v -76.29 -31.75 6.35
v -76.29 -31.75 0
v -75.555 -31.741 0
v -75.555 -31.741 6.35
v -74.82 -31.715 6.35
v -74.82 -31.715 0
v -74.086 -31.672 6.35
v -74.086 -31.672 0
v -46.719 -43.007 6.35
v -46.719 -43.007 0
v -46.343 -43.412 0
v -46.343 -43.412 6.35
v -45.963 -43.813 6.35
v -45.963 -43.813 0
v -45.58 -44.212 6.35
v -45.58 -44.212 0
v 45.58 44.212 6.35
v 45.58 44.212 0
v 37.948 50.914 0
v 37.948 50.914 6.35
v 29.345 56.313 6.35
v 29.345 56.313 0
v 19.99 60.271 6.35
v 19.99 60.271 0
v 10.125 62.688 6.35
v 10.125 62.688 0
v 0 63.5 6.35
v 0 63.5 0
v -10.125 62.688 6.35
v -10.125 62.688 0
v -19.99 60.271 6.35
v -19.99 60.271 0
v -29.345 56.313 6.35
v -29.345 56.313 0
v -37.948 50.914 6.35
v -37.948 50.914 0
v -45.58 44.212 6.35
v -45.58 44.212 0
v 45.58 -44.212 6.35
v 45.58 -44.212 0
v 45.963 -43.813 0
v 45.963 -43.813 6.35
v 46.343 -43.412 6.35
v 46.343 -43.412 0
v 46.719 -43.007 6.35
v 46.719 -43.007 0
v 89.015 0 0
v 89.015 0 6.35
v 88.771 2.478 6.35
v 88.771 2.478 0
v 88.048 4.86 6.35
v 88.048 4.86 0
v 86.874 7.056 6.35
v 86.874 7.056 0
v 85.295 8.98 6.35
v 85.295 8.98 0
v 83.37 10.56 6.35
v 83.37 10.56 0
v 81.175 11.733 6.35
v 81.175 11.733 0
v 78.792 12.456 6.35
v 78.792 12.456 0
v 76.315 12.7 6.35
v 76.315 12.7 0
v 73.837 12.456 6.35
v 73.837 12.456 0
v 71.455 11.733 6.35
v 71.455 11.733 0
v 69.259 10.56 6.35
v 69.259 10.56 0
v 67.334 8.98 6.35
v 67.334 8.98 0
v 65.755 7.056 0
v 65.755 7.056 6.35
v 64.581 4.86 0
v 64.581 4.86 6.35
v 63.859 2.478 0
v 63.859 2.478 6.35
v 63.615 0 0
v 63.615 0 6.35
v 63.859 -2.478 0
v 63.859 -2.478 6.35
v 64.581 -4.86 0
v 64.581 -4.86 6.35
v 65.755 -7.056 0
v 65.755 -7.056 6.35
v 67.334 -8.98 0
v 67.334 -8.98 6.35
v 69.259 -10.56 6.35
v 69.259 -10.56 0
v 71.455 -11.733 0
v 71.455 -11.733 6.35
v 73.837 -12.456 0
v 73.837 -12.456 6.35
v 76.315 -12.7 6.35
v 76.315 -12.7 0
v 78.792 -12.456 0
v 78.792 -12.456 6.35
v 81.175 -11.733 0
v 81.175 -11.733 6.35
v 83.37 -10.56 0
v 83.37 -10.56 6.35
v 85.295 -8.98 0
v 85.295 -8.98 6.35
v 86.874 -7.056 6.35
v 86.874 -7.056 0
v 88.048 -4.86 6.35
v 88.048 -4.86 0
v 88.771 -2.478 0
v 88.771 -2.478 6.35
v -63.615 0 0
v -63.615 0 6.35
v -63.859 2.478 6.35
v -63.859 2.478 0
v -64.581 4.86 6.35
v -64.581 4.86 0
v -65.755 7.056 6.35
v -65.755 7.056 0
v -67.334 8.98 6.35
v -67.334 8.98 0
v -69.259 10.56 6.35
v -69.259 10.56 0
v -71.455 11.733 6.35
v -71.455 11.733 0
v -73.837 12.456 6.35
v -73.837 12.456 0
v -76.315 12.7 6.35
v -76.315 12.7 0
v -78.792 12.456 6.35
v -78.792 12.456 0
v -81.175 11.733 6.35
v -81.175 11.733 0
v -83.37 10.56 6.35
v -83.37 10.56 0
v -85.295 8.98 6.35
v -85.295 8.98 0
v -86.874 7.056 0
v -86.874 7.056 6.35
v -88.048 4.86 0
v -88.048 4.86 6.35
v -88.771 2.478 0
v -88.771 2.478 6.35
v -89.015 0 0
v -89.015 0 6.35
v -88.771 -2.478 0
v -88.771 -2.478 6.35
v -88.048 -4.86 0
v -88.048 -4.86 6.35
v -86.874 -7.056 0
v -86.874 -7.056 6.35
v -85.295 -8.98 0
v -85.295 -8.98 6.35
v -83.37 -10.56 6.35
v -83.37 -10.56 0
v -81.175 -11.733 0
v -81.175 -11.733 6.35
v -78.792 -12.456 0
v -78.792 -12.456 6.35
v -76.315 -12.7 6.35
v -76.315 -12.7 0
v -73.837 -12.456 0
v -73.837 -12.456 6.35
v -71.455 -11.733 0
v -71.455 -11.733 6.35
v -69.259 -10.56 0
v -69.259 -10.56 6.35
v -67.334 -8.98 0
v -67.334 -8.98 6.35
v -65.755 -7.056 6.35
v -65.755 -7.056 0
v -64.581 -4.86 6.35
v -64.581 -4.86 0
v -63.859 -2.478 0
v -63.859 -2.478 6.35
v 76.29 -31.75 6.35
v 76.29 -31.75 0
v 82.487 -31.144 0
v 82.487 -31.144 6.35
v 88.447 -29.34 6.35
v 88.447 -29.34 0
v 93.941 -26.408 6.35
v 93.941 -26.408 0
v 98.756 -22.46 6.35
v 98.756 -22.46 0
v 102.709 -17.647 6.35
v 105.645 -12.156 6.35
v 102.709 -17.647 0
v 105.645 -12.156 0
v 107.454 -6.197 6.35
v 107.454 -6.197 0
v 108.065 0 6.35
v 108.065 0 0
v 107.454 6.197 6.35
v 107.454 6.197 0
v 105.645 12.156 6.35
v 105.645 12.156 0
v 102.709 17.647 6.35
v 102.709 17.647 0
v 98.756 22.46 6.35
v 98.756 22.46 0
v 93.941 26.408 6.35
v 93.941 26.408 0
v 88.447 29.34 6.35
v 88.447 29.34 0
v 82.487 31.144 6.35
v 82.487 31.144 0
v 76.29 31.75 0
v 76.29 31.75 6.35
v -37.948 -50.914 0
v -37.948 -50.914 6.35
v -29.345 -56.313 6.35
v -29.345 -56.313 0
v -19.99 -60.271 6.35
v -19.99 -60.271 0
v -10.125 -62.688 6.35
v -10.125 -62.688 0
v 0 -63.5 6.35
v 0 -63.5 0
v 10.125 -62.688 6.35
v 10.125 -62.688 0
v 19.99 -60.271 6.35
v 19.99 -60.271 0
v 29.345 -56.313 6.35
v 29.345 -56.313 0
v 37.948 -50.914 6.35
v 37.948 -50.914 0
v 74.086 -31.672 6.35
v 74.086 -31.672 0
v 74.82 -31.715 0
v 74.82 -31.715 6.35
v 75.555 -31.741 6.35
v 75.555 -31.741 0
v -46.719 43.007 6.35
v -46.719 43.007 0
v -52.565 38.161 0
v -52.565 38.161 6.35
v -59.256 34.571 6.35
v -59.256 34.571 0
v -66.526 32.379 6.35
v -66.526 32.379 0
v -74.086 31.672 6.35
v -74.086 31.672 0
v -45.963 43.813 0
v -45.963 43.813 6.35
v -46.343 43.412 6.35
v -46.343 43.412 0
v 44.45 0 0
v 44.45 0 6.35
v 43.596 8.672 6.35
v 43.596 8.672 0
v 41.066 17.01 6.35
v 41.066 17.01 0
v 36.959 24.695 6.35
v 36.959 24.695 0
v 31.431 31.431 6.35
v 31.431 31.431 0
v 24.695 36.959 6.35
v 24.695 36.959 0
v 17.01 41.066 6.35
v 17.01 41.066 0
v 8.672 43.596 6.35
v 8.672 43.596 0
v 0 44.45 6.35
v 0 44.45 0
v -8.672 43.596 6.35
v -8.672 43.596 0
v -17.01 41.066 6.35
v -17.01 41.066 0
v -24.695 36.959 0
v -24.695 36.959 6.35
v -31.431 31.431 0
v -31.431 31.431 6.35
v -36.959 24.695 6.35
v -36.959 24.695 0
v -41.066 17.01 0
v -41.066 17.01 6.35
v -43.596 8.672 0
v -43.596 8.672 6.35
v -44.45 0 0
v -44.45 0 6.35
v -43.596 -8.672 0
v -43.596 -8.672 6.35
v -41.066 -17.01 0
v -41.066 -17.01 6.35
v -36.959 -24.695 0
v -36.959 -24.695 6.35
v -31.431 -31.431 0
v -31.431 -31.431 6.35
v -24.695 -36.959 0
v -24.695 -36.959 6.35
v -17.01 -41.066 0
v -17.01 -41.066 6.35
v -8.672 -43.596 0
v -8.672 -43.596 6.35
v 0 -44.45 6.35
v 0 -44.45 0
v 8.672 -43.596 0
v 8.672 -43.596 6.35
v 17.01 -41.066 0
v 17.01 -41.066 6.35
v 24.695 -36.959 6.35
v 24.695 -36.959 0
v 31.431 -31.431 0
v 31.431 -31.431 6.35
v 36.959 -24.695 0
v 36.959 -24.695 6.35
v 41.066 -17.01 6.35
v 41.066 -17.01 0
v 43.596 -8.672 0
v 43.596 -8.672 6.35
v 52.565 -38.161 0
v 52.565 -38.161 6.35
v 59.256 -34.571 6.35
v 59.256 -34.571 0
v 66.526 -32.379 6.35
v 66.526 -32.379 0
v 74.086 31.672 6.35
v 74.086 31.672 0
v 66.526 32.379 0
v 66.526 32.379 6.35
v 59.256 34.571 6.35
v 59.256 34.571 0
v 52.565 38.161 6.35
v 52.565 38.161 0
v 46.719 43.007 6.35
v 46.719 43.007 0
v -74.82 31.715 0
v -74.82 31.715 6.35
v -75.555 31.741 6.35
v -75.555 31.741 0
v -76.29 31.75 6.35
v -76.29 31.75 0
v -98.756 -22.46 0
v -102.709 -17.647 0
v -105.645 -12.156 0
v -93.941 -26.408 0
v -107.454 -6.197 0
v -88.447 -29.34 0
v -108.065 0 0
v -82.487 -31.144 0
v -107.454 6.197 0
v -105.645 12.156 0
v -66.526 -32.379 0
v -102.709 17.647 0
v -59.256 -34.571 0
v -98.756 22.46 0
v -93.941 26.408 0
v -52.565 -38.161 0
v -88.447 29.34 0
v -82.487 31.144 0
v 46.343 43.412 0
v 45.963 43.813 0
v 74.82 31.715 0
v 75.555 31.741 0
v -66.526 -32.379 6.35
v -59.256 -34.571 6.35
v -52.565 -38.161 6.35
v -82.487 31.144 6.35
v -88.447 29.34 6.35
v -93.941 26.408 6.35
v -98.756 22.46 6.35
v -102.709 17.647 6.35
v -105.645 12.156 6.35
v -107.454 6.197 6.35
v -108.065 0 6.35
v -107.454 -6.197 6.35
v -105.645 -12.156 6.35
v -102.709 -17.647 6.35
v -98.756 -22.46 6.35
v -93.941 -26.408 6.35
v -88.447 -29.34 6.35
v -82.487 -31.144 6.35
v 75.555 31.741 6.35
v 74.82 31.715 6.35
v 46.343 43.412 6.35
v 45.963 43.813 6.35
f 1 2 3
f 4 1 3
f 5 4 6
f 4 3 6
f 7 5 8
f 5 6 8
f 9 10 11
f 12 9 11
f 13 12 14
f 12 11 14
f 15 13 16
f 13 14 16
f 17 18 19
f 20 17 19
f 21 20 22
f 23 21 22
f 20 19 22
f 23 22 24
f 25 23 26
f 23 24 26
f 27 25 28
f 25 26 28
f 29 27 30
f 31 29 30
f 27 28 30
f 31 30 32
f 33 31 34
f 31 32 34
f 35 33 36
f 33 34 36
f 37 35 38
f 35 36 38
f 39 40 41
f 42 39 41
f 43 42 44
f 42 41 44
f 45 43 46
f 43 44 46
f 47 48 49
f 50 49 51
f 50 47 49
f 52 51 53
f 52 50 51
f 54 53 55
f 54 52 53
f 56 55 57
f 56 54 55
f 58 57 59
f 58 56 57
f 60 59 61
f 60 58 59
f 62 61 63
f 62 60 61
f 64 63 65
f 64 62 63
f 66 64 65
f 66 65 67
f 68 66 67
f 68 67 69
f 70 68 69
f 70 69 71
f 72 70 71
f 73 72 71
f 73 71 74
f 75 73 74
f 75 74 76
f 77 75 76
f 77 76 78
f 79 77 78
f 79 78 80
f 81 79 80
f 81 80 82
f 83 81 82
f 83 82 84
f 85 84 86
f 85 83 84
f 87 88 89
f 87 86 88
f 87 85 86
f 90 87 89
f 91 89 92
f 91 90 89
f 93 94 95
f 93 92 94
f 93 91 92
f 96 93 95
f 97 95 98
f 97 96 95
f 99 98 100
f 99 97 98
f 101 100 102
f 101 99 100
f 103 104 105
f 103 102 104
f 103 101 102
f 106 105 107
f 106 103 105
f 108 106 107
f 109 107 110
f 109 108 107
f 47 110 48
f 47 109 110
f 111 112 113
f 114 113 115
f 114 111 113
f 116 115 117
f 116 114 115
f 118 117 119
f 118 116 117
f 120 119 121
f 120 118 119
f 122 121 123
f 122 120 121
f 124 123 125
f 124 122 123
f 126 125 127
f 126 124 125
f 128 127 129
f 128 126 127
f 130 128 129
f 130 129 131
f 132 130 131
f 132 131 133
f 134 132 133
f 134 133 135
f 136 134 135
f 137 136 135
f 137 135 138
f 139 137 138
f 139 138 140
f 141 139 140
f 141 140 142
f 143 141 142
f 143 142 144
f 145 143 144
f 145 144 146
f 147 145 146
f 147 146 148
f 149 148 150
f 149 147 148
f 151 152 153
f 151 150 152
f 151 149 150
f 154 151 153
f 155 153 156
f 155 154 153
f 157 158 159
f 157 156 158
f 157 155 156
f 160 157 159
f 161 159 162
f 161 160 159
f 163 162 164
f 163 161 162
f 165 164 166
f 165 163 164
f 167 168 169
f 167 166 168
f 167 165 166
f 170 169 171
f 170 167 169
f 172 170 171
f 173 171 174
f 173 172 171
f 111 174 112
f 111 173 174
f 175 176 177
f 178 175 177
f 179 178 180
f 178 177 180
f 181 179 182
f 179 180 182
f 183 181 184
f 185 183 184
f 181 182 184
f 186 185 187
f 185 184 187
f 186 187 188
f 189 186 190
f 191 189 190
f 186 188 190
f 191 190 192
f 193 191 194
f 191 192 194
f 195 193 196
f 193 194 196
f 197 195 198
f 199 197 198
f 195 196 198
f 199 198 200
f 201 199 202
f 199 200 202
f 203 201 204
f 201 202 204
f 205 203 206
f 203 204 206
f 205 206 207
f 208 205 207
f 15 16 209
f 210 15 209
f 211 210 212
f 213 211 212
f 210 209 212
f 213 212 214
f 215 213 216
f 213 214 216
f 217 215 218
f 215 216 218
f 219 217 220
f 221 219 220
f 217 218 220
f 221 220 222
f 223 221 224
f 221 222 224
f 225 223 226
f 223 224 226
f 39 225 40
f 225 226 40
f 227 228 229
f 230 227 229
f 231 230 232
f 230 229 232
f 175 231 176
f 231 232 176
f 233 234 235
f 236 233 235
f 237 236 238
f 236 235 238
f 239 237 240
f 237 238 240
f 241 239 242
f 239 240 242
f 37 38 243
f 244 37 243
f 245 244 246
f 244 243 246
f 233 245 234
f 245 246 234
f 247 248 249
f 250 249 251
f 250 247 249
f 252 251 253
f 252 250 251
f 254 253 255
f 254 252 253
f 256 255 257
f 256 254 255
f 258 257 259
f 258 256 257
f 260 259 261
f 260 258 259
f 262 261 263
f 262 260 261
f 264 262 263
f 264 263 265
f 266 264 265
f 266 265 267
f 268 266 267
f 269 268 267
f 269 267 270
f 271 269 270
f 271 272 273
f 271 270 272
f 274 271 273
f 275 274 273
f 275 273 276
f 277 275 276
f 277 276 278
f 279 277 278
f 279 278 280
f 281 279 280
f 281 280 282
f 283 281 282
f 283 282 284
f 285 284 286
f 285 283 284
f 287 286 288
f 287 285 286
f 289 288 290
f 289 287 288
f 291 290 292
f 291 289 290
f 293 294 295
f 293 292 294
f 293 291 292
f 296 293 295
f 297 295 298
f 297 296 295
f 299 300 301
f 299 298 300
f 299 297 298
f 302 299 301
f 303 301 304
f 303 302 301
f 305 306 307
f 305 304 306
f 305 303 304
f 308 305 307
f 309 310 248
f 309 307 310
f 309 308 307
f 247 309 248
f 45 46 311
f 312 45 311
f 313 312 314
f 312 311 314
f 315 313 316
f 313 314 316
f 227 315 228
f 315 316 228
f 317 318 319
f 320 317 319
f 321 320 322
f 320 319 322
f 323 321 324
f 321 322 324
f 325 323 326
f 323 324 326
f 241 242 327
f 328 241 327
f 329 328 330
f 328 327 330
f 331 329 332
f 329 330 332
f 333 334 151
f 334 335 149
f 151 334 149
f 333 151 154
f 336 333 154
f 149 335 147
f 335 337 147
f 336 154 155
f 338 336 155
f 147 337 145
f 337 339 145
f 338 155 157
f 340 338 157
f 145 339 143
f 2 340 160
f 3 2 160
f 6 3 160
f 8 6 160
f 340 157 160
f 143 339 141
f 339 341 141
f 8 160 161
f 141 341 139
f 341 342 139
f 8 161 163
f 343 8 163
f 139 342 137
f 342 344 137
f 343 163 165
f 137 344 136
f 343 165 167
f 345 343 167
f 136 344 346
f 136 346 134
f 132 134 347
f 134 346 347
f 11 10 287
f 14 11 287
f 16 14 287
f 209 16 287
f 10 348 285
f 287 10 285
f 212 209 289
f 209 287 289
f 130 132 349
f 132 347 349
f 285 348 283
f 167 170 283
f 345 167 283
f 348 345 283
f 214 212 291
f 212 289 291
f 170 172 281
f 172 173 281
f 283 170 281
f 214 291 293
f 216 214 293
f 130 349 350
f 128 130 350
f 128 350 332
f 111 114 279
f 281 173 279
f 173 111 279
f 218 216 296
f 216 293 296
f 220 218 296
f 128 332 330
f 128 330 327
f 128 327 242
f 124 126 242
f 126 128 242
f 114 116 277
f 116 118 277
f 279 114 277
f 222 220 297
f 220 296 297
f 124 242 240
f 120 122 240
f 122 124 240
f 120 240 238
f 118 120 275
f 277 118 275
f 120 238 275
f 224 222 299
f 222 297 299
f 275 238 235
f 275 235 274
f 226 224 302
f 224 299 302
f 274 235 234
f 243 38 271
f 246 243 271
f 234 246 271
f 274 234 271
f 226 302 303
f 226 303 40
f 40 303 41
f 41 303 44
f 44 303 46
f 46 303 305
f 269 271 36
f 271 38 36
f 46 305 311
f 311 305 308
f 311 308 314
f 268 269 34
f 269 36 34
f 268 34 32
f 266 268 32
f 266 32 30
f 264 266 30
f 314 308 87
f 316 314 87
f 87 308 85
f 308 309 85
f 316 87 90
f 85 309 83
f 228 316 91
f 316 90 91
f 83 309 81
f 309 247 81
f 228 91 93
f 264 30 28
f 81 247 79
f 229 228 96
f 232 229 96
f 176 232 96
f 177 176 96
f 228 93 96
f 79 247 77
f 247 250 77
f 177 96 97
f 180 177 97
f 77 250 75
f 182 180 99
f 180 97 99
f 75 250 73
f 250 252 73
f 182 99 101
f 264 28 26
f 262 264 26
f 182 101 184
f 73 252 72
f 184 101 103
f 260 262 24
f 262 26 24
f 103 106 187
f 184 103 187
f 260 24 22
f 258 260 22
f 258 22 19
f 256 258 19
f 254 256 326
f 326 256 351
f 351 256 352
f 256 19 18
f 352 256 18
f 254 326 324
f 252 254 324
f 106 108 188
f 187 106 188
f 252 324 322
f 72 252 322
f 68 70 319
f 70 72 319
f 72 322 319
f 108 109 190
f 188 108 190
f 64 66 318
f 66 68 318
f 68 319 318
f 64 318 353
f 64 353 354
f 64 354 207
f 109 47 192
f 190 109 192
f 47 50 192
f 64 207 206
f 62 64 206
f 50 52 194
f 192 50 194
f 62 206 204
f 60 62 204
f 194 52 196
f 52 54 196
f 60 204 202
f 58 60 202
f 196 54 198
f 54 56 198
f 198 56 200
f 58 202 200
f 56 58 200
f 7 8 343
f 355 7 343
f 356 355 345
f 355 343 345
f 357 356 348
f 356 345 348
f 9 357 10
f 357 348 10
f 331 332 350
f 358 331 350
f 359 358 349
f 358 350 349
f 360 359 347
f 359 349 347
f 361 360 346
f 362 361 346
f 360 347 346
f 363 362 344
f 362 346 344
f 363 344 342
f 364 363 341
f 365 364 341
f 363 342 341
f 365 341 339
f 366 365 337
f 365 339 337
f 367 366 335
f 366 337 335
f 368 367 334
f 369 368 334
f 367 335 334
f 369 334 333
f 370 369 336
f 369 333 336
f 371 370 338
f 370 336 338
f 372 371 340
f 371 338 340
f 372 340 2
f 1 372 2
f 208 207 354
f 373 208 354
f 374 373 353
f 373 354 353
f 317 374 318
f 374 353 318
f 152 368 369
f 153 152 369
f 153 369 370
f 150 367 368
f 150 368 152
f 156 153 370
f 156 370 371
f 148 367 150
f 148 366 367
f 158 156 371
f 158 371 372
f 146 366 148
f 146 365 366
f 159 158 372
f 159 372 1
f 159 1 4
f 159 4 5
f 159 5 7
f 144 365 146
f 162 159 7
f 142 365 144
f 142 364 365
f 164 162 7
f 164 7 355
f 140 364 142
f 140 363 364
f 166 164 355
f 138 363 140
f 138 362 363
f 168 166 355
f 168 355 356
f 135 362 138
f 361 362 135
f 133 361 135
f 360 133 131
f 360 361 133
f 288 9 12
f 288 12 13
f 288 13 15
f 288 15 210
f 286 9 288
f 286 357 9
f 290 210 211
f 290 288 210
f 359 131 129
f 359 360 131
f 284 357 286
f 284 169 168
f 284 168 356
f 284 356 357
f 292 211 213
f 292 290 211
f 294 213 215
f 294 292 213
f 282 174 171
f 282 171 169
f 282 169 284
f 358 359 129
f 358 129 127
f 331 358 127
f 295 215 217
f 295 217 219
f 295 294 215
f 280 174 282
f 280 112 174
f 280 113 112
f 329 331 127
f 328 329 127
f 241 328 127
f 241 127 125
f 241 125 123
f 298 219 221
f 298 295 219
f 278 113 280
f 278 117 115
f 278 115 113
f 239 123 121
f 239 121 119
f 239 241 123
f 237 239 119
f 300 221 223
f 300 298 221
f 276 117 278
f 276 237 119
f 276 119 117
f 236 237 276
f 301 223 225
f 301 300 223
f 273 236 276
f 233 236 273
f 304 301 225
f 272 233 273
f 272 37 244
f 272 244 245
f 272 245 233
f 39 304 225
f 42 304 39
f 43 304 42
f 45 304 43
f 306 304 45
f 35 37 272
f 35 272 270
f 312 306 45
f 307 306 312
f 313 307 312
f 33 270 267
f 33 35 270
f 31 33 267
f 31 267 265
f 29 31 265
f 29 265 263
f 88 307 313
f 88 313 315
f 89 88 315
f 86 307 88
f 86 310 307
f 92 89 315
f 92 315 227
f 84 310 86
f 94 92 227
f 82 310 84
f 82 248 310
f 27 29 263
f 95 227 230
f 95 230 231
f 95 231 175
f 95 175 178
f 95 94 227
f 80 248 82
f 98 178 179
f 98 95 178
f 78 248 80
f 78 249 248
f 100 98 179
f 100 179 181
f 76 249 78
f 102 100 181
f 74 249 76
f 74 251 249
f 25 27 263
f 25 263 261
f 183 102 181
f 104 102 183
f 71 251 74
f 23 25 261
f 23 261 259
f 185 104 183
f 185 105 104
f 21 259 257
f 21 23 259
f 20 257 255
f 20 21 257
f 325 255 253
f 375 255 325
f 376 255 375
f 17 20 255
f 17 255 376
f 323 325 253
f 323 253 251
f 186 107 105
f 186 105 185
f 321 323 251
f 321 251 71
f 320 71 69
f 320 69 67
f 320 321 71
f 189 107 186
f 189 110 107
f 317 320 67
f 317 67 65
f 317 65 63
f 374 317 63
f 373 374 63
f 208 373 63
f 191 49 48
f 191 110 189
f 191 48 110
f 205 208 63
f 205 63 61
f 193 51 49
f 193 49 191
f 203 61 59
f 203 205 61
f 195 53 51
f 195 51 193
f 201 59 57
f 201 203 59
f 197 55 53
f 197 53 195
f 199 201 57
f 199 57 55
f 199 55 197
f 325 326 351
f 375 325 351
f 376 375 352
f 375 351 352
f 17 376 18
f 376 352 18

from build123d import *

# Parameters (mm, degrees)
F0_R     = 12.7
F0_R_2   = 44.45
F1_DEPTH = 6.35
F2_DEPTH = 6.35


with BuildPart() as f1:
    # F0 (on Top) → F1 (new body)
    with BuildSketch(Plane.XY):
        with BuildLine():
            ThreePointArc((-74.086042, -31.671685), (-59.255851, -34.570734), (-46.719019, -43.006782))
            ThreePointArc((-46.719019, -43.006782), (-46.143146, -43.603071), (-45.580383, -44.211748))
            ThreePointArc((-45.580383, -44.211748), (0, -63.5), (45.580383, -44.211748))
            ThreePointArc((45.580383, -44.211748), (46.143146, -43.603071), (46.719019, -43.006782))
            ThreePointArc((46.719019, -43.006782), (59.255851, -34.570734), (74.086042, -31.671685))
            ThreePointArc((74.086042, -31.671685), (75.188385, -31.694894), (76.289594, -31.74999))
            ThreePointArc((76.289594, -31.74999), (108.064688, 0), (76.289594, 31.74999))
            ThreePointArc((76.289594, 31.74999), (75.188385, 31.694894), (74.086042, 31.671685))
            ThreePointArc((74.086042, 31.671685), (59.255851, 34.570734), (46.719019, 43.006782))
            ThreePointArc((46.719019, 43.006782), (46.143146, 43.603071), (45.580383, 44.211748))
            ThreePointArc((45.580383, 44.211748), (0, 63.5), (-45.580383, 44.211748))
            ThreePointArc((-45.580383, 44.211748), (-46.143146, 43.603071), (-46.719019, 43.006782))
            ThreePointArc((-46.719019, 43.006782), (-59.255851, 34.570734), (-74.086042, 31.671685))
            ThreePointArc((-74.086042, 31.671685), (-75.188385, 31.694894), (-76.289594, 31.74999))
            ThreePointArc((-76.289594, 31.74999), (-108.064688, 0), (-76.289594, -31.74999))
            ThreePointArc((-76.289594, -31.74999), (-75.188385, -31.694894), (-74.086042, -31.671685))
        make_face()
        with Locations((-76.314688, 0)):
            Circle(F0_R, mode=Mode.SUBTRACT)
        Circle(F0_R_2, mode=Mode.SUBTRACT)
        with Locations((76.314688, 0)):
            Circle(F0_R, mode=Mode.SUBTRACT)
    extrude(amount=F1_DEPTH)

    # F0 (on Top) → F2 (join)
    with BuildSketch(Plane.XY):
        with BuildLine():
            ThreePointArc((-45.580383, -44.211748), (-46.143146, -43.603071), (-46.719019, -43.006782))
            ThreePointArc((-46.719019, -43.006782), (-46.153633, -43.612981), (-45.580383, -44.211748))
        make_face()
        with BuildLine():
            ThreePointArc((-74.086042, -31.671685), (-59.255851, -34.570734), (-46.719019, -43.006782))
            ThreePointArc((-46.719019, -43.006782), (-46.143146, -43.603071), (-45.580383, -44.211748))
            ThreePointArc((-45.580383, -44.211748), (0, -63.5), (45.580383, -44.211748))
            ThreePointArc((45.580383, -44.211748), (46.143146, -43.603071), (46.719019, -43.006782))
            ThreePointArc((46.719019, -43.006782), (59.255851, -34.570734), (74.086042, -31.671685))
            ThreePointArc((74.086042, -31.671685), (75.188385, -31.694894), (76.289594, -31.74999))
            ThreePointArc((76.289594, -31.74999), (108.064688, 0), (76.289594, 31.74999))
            ThreePointArc((76.289594, 31.74999), (75.188385, 31.694894), (74.086042, 31.671685))
            ThreePointArc((74.086042, 31.671685), (59.255851, 34.570734), (46.719019, 43.006782))
            ThreePointArc((46.719019, 43.006782), (46.143146, 43.603071), (45.580383, 44.211748))
            ThreePointArc((45.580383, 44.211748), (0, 63.5), (-45.580383, 44.211748))
            ThreePointArc((-45.580383, 44.211748), (-46.143146, 43.603071), (-46.719019, 43.006782))
            ThreePointArc((-46.719019, 43.006782), (-59.255851, 34.570734), (-74.086042, 31.671685))
            ThreePointArc((-74.086042, 31.671685), (-75.188385, 31.694894), (-76.289594, 31.74999))
            ThreePointArc((-76.289594, 31.74999), (-108.064688, 0), (-76.289594, -31.74999))
            ThreePointArc((-76.289594, -31.74999), (-75.188385, -31.694894), (-74.086042, -31.671685))
        make_face()
        with Locations((-76.314688, 0)):
            Circle(F0_R, mode=Mode.SUBTRACT)
        Circle(F0_R_2, mode=Mode.SUBTRACT)
        with Locations((76.314688, 0)):
            Circle(F0_R, mode=Mode.SUBTRACT)
        with BuildLine():
            ThreePointArc((-76.289594, -31.74999), (-75.187138, -31.729972), (-74.086042, -31.671685))
            ThreePointArc((-74.086042, -31.671685), (-75.188385, -31.694894), (-76.289594, -31.74999))
        make_face()
        with BuildLine():
            ThreePointArc((46.719019, -43.006782), (46.143146, -43.603071), (45.580383, -44.211748))
            ThreePointArc((45.580383, -44.211748), (46.153633, -43.612981), (46.719019, -43.006782))
        make_face()
        with BuildLine():
            ThreePointArc((-74.086042, 31.671685), (-75.187138, 31.729972), (-76.289594, 31.74999))
            ThreePointArc((-76.289594, 31.74999), (-75.188385, 31.694894), (-74.086042, 31.671685))
        make_face()
        with BuildLine():
            ThreePointArc((76.289594, -31.74999), (75.188385, -31.694894), (74.086042, -31.671685))
            ThreePointArc((74.086042, -31.671685), (75.187138, -31.729972), (76.289594, -31.74999))
        make_face()
        with BuildLine():
            ThreePointArc((-45.580383, 44.211748), (-46.153633, 43.612981), (-46.719019, 43.006782))
            ThreePointArc((-46.719019, 43.006782), (-46.143146, 43.603071), (-45.580383, 44.211748))
        make_face()
        with BuildLine():
            ThreePointArc((74.086042, 31.671685), (75.188385, 31.694894), (76.289594, 31.74999))
            ThreePointArc((76.289594, 31.74999), (75.187138, 31.729972), (74.086042, 31.671685))
        make_face()
        with BuildLine():
            ThreePointArc((46.719019, 43.006782), (46.153633, 43.612981), (45.580383, 44.211748))
            ThreePointArc((45.580383, 44.211748), (46.143146, 43.603071), (46.719019, 43.006782))
        make_face()
    extrude(amount=F2_DEPTH)

    # F3: F1 across plane


with BuildPart() as f1_1:
    add(f1.part)
    add(f1.part.mirror(Plane.YZ))

    # F4: F1 across plane


with BuildPart() as f1_2:
    add(f1_1.part)
    add(f1_1.part.mirror(Plane.XZ))


solid = f1_2.part
